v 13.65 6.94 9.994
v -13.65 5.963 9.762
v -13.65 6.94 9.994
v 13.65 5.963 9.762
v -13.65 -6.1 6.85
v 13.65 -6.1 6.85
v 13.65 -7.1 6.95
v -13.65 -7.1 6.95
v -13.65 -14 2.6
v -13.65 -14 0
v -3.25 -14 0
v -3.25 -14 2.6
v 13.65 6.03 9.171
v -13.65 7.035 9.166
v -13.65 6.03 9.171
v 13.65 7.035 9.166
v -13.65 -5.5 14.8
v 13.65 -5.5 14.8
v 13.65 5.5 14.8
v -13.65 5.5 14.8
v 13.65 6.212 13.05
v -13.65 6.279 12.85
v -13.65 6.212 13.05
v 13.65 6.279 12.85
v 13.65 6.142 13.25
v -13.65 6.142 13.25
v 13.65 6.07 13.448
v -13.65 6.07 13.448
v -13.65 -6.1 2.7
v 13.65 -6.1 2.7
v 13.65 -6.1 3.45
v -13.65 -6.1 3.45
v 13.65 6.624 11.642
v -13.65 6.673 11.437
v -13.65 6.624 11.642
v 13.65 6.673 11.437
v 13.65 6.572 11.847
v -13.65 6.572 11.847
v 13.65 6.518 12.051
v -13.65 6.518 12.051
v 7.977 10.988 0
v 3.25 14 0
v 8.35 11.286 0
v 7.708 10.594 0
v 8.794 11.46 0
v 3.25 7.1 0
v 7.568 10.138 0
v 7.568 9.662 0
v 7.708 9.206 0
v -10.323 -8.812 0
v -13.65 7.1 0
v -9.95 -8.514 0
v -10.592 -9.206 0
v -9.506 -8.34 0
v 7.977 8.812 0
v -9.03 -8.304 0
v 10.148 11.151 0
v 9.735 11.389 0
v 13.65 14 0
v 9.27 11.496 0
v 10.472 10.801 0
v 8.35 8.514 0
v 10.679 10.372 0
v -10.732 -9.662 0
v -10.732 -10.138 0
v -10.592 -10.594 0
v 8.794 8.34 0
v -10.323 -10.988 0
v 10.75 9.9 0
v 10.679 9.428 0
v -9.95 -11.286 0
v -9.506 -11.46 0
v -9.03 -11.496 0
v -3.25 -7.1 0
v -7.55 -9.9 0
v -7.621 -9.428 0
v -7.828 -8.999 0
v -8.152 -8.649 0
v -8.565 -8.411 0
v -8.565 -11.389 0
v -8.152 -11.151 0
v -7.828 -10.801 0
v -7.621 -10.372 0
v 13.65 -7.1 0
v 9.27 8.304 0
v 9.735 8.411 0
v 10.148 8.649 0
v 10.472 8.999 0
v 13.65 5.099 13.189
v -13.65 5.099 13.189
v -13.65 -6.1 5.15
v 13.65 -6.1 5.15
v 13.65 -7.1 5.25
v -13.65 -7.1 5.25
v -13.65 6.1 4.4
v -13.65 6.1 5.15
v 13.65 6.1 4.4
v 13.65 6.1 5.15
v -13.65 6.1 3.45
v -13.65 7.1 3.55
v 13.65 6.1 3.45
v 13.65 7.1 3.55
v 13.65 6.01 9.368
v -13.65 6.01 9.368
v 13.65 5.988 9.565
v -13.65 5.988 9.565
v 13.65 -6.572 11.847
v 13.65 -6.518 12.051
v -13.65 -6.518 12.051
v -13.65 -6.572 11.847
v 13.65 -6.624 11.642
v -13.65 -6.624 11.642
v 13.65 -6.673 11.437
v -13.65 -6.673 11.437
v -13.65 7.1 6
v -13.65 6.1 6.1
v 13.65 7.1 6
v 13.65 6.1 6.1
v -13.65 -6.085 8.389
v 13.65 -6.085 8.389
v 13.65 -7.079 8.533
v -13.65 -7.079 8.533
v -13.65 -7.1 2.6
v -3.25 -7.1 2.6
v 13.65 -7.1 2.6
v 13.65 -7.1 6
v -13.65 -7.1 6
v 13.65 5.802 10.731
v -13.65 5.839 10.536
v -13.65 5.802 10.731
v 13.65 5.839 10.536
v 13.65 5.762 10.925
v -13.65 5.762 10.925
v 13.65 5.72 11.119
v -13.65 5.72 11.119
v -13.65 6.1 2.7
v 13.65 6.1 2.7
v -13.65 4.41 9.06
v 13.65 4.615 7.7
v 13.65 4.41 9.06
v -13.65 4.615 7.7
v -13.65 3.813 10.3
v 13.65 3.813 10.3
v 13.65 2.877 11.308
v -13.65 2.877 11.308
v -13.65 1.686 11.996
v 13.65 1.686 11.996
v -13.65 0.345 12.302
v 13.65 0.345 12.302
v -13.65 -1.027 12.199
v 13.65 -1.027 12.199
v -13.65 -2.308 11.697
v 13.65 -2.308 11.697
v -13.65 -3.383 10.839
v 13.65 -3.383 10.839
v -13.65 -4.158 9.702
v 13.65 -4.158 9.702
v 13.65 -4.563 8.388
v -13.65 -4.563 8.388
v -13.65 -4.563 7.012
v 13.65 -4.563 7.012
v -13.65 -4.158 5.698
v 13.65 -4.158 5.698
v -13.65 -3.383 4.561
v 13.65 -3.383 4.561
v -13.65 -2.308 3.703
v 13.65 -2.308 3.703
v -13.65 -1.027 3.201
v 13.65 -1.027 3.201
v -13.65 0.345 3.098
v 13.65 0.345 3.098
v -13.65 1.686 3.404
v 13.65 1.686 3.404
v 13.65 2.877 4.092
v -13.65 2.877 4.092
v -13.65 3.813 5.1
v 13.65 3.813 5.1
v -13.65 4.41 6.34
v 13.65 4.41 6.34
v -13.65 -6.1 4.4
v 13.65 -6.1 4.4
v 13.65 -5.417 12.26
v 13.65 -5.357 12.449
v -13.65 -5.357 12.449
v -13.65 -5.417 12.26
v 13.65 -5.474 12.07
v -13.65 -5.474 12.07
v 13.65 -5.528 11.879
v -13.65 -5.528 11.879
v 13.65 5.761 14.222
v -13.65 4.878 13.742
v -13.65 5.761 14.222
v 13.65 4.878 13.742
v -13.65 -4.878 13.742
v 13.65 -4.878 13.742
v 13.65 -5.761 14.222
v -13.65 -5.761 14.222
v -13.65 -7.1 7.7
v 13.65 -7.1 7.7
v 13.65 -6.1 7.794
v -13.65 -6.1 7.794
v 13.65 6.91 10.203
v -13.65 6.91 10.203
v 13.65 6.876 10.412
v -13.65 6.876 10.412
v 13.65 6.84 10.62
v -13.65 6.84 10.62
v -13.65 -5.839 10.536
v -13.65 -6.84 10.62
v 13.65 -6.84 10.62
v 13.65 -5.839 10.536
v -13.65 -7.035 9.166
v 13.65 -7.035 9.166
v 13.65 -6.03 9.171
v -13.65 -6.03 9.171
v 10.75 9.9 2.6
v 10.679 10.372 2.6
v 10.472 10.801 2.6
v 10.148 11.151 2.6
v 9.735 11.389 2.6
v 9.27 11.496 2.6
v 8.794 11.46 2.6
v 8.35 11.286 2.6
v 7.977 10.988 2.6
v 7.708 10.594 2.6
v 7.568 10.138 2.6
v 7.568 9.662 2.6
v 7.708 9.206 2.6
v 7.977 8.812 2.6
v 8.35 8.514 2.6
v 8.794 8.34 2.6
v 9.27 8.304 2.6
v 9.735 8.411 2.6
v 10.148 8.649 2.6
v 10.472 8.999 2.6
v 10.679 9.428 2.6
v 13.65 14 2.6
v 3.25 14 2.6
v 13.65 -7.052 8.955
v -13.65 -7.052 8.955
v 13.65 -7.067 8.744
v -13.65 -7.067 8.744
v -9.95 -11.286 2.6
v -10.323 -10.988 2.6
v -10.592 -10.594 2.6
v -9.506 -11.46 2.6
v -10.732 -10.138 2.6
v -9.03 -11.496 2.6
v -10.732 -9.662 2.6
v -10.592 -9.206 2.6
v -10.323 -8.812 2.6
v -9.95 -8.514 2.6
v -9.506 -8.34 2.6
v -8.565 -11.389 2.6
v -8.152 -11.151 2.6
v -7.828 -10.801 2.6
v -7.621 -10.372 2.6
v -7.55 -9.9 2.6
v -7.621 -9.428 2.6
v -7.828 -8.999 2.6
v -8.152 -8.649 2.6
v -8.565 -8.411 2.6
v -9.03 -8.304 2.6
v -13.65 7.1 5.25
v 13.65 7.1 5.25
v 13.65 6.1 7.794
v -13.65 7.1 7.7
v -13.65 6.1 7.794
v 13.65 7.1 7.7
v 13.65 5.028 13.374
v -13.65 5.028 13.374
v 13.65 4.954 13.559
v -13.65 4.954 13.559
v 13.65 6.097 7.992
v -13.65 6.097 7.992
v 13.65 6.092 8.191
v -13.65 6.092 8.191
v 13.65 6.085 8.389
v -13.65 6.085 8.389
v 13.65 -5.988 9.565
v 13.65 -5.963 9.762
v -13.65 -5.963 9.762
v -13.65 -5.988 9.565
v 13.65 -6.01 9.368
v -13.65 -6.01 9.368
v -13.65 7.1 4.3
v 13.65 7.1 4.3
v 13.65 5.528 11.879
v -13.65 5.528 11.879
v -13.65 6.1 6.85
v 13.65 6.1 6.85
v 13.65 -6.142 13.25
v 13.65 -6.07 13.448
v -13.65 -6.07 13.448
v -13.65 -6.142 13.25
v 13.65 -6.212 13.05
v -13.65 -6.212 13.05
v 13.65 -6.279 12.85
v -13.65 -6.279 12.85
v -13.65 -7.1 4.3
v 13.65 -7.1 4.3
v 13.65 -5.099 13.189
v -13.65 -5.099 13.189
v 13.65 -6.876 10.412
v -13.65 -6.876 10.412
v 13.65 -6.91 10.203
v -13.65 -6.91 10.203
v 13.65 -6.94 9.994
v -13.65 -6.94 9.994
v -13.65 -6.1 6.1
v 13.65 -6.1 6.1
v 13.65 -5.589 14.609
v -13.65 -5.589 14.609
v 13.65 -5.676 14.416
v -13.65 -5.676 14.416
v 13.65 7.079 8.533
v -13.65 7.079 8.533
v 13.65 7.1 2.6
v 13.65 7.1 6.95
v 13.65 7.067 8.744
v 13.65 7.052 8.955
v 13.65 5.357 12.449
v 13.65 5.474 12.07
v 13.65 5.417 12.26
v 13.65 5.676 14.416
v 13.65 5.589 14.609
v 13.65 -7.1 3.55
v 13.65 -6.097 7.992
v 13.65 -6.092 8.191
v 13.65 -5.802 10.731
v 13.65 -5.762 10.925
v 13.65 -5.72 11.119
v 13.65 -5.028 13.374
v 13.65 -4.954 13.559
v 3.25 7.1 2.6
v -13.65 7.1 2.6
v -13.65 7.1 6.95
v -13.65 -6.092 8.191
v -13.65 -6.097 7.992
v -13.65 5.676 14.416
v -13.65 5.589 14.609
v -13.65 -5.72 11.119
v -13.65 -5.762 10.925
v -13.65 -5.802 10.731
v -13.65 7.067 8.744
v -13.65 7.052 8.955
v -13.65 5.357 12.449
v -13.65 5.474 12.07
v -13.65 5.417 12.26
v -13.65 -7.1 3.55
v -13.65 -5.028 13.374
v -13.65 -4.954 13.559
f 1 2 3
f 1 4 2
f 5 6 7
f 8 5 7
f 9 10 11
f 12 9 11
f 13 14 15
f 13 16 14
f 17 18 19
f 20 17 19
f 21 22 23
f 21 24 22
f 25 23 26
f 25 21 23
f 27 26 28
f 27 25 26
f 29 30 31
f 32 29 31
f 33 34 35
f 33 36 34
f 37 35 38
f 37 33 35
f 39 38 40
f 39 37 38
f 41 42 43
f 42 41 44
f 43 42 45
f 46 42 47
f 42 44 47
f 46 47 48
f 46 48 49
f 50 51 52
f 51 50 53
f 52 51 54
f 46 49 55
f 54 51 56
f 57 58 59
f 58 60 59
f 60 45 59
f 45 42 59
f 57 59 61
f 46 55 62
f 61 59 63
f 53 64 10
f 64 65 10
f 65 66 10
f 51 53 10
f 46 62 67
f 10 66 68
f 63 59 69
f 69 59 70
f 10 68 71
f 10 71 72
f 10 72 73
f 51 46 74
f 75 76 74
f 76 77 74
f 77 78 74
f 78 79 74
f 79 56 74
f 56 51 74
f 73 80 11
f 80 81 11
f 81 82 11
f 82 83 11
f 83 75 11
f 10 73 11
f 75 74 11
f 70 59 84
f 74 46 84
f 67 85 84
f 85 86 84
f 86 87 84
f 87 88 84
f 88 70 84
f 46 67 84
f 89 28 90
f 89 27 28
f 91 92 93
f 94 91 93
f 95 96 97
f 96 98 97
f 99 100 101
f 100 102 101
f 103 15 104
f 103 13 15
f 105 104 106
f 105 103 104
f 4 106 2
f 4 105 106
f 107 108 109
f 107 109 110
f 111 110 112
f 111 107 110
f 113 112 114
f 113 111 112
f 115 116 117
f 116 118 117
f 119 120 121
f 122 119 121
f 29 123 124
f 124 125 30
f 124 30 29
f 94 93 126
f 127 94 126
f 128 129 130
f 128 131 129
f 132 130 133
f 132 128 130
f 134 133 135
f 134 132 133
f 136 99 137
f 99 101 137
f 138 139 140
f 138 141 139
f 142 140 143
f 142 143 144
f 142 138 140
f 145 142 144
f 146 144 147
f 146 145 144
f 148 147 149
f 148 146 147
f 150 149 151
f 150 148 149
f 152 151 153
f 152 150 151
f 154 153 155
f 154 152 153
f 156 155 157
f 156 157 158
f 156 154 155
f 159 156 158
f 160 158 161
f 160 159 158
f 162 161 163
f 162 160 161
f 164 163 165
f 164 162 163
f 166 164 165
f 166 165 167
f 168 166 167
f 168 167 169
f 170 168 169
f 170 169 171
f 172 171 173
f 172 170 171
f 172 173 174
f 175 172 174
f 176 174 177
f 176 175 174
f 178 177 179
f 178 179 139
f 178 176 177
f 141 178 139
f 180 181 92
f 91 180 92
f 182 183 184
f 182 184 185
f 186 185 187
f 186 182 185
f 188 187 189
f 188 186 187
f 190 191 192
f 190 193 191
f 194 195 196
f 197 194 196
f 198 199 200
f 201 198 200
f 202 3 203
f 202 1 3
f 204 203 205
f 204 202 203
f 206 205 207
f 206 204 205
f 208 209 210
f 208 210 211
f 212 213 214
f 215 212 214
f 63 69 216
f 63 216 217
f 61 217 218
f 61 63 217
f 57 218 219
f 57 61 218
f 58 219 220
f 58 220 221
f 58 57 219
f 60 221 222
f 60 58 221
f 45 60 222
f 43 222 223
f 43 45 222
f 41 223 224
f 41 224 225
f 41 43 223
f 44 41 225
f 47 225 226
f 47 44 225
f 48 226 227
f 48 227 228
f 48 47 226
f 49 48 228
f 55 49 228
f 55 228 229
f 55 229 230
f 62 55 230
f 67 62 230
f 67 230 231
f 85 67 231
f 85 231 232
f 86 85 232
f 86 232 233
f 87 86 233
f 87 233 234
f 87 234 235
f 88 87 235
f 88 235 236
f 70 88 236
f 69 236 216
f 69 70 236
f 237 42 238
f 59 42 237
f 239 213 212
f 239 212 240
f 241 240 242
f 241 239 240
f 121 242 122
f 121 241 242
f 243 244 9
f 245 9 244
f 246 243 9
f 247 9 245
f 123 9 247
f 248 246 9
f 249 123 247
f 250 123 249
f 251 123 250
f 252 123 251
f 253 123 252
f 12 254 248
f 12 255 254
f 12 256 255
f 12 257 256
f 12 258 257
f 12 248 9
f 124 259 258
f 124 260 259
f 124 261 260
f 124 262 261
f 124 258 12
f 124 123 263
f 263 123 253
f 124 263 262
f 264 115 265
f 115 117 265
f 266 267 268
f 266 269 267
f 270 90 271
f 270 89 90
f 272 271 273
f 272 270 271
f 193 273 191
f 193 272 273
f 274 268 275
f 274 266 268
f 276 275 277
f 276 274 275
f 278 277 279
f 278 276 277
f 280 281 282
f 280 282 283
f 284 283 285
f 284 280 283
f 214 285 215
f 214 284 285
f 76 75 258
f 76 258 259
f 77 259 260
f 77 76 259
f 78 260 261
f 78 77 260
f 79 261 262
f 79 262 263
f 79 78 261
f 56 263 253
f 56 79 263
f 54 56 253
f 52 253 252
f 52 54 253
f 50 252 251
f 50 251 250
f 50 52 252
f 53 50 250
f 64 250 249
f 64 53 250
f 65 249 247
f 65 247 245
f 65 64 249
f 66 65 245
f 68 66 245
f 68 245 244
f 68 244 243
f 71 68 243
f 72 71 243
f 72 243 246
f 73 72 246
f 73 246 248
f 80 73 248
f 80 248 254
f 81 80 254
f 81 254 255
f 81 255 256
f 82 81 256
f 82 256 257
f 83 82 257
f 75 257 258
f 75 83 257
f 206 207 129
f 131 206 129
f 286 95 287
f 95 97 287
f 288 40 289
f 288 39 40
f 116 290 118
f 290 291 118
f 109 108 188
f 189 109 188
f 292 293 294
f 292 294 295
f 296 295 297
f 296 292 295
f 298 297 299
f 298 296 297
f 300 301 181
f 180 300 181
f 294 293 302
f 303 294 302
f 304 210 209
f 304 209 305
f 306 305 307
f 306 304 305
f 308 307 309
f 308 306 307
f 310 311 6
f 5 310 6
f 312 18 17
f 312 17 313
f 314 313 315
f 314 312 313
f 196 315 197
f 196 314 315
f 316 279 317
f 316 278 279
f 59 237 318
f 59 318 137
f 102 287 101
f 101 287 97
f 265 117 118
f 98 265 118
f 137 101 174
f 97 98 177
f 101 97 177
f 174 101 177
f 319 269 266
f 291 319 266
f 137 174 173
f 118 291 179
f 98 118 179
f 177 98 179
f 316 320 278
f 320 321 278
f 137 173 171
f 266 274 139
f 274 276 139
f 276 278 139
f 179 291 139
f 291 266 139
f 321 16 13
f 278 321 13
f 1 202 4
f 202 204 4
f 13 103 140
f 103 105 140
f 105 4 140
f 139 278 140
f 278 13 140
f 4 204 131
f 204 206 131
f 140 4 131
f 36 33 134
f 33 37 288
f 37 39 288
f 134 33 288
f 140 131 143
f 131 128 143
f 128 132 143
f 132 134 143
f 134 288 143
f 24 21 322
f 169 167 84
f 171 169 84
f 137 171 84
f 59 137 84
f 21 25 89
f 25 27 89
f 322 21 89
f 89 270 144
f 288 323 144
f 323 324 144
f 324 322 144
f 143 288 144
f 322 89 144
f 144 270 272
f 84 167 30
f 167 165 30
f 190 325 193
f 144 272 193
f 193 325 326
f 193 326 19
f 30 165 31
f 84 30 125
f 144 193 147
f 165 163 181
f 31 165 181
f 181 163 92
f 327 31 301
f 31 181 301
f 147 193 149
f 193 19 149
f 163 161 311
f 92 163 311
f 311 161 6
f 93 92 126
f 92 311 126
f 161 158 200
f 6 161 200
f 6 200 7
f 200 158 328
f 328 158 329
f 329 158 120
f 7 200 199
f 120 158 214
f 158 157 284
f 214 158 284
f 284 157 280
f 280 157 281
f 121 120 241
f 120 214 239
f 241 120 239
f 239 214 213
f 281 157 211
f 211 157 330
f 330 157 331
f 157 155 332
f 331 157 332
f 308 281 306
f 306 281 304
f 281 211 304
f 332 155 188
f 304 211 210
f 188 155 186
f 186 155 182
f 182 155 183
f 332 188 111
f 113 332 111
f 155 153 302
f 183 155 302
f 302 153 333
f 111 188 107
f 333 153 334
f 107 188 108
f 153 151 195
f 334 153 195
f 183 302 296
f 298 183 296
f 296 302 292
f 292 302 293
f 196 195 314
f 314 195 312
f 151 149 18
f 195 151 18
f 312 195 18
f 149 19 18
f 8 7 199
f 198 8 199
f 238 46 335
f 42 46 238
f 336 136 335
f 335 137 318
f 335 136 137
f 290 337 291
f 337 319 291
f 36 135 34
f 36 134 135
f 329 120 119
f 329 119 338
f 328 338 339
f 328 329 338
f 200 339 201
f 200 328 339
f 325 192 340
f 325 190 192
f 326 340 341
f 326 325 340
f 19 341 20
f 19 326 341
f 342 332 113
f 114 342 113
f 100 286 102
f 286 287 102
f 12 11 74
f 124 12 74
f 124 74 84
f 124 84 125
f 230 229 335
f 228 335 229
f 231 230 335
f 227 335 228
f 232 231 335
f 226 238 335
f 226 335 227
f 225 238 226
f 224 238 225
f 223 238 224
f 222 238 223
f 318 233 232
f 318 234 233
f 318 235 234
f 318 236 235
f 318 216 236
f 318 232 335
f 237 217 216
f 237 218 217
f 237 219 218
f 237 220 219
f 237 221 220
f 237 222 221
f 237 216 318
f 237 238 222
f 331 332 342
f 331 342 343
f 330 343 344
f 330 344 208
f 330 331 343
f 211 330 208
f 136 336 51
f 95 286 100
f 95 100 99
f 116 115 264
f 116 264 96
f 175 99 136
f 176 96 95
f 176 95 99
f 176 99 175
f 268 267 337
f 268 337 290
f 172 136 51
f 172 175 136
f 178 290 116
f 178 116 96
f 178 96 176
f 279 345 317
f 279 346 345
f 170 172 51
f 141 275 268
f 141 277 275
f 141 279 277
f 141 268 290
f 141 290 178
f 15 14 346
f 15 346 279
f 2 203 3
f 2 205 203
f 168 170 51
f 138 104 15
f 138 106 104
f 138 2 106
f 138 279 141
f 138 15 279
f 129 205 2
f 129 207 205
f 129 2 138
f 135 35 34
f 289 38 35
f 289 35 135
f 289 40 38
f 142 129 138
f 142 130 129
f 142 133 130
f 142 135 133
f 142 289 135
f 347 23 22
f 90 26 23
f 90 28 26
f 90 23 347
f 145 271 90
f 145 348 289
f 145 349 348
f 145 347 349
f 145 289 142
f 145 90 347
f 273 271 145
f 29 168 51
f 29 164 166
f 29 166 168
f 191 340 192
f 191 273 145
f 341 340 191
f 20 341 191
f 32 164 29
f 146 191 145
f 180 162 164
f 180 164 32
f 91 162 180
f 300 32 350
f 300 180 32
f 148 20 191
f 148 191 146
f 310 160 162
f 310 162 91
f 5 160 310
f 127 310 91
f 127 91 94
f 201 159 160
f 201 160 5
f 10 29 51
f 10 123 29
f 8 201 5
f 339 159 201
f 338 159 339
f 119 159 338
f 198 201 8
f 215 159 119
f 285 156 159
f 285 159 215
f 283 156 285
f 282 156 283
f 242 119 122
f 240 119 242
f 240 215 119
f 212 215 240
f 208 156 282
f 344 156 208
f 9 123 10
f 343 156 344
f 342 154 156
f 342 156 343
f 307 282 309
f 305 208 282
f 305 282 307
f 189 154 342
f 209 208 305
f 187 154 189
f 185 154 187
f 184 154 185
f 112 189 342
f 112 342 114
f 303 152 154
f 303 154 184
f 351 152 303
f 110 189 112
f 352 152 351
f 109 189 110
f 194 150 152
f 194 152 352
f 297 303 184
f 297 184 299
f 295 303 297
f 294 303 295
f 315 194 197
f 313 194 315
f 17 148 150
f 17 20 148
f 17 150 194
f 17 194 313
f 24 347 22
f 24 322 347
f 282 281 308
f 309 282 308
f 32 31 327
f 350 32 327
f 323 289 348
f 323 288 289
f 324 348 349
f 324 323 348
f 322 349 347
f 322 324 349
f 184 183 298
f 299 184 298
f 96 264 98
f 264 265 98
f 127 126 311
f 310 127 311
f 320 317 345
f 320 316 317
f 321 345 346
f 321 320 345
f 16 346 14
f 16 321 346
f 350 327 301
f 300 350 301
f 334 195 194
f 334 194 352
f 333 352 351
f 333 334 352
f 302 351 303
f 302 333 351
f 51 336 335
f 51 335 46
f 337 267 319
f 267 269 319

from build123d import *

# Parameters (mm, degrees)
SKETCH_R         = 4.615
EXTRUDE_DEPTH    = 13.65
SKETCH001_W      = 10.4
SKETCH001_H      = 6.9
SKETCH001_R      = 1.6
EXTRUDE001_DEPTH = 2.6


with BuildPart() as body_main:
    # Sketch → Extrude (new body, symmetric)
    with BuildSketch(Plane.YZ):
        with BuildLine():
            Line((-5.5, 14.8), (5.5, 14.8))
            ThreePointArc((5.760824, 14.2224), (5.633177, 14.512448), (5.5, 14.8))
            Line((4.878487, 13.741903), (5.760824, 14.2224))
            ThreePointArc((5.099264, 13.188869), (4.991522, 13.466442), (4.878487, 13.741903))
            Line((6.069929, 13.448108), (5.099264, 13.188869))
            ThreePointArc((6.278586, 12.849682), (6.177122, 13.149894), (6.069929, 13.448108))
            Line((5.357169, 12.449197), (6.278586, 12.849682))
            ThreePointArc((5.528111, 11.878788), (5.44537, 12.164811), (5.357169, 12.449197))
            Line((6.517918, 12.051062), (5.528111, 11.878788))
            ThreePointArc((6.672768, 11.436511), (6.598284, 11.744528), (6.517918, 12.051062))
            Line((5.719511, 11.119185), (6.672768, 11.436511))
            ThreePointArc((5.839274, 10.53588), (5.782184, 10.828106), (5.719511, 11.119185))
            Line((6.840447, 10.619837), (5.839274, 10.53588))
            ThreePointArc((6.940275, 9.993989), (6.893357, 10.307391), (6.840447, 10.619837))
            Line((5.962664, 9.762314), (6.940275, 9.993989))
            ThreePointArc((6.03031, 9.170696), (5.999319, 9.466829), (5.962664, 9.762314))
            Line((7.034984, 9.165675), (6.03031, 9.170696))
            ThreePointArc((7.079005, 8.533446), (7.06002, 8.849771), (7.034984, 9.165675))
            Line((6.08472, 8.389243), (7.079005, 8.533446))
            ThreePointArc((6.099716, 7.793958), (6.095067, 8.091672), (6.08472, 8.389243))
            Line((7.1, 7.7), (6.099716, 7.793958))
            Line((7.1, 7.7), (7.1, 6.95))
            Line((7.1, 6.95), (6.1, 6.85))
            Line((6.1, 6.85), (6.1, 6.1))
            Line((6.1, 6.1), (7.1, 6))
            Line((7.1, 6), (7.1, 5.25))
            Line((7.1, 5.25), (6.1, 5.15))
            Line((6.1, 5.15), (6.1, 4.4))
            Line((6.1, 4.4), (7.1, 4.3))
            Line((7.1, 4.3), (7.1, 3.55))
            Line((7.1, 3.55), (6.1, 3.45))
            Line((6.1, 3.45), (6.1, 2.7))
            Line((6.1, 2.7), (7.1, 2.6))
            Line((7.1, 2.6), (7.1, 0))
            Line((7.1, 0), (-7.1, 0))
            Line((-7.1, 0), (-7.1, 2.6))
            Line((-7.1, 2.6), (-6.1, 2.7))
            Line((-6.1, 2.7), (-6.1, 3.45))
            Line((-6.1, 3.45), (-7.1, 3.55))
            Line((-7.1, 3.55), (-7.1, 4.3))
            Line((-7.1, 4.3), (-6.1, 4.4))
            Line((-6.1, 4.4), (-6.1, 5.15))
            Line((-6.1, 5.15), (-7.1, 5.25))
            Line((-7.1, 5.25), (-7.1, 6))
            Line((-7.1, 6), (-6.1, 6.1))
            Line((-6.1, 6.1), (-6.1, 6.85))
            Line((-6.1, 6.85), (-7.1, 6.95))
            Line((-7.1, 6.95), (-7.1, 7.7))
            Line((-7.1, 7.7), (-6.099716, 7.793958))
            ThreePointArc((-6.08472, 8.389243), (-6.095067, 8.091672), (-6.099716, 7.793958))
            Line((-6.08472, 8.389243), (-7.079005, 8.533446))
            ThreePointArc((-7.034984, 9.165675), (-7.06002, 8.849771), (-7.079005, 8.533446))
            Line((-7.034984, 9.165675), (-6.03031, 9.170696))
            ThreePointArc((-5.962664, 9.762314), (-5.999319, 9.466829), (-6.03031, 9.170696))
            Line((-5.962664, 9.762314), (-6.940275, 9.993989))
            ThreePointArc((-6.840447, 10.619837), (-6.893357, 10.307391), (-6.940275, 9.993989))
            Line((-6.840447, 10.619837), (-5.839274, 10.53588))
            ThreePointArc((-5.719511, 11.119185), (-5.782184, 10.828106), (-5.839274, 10.53588))
            Line((-5.719511, 11.119185), (-6.672768, 11.436511))
            ThreePointArc((-6.517918, 12.051062), (-6.598284, 11.744528), (-6.672768, 11.436511))
            Line((-6.517918, 12.051062), (-5.528111, 11.878788))
            ThreePointArc((-5.357169, 12.449197), (-5.44537, 12.164811), (-5.528111, 11.878788))
            Line((-5.357169, 12.449197), (-6.278586, 12.849682))
            ThreePointArc((-6.069929, 13.448108), (-6.177122, 13.149894), (-6.278586, 12.849682))
            Line((-6.069929, 13.448108), (-5.099264, 13.188869))
            ThreePointArc((-4.878487, 13.741903), (-4.991522, 13.466442), (-5.099264, 13.188869))
            Line((-4.878487, 13.741903), (-5.760824, 14.2224))
            ThreePointArc((-5.5, 14.8), (-5.633177, 14.512448), (-5.760824, 14.2224))
        make_face()
        with Locations((0, 7.7)):
            Circle(SKETCH_R, mode=Mode.SUBTRACT)
    extrude(amount=EXTRUDE_DEPTH, both=True)


with BuildPart() as body:
    # Sketch001 → Extrude001 (new body)
    with BuildSketch(Plane.XY):
        with Locations((8.45, 10.55)):
            Rectangle(SKETCH001_W, SKETCH001_H)
        with Locations((9.15, 9.9)):
            Circle(SKETCH001_R, mode=Mode.SUBTRACT)
        with Locations((-8.45, -10.55)):
            Rectangle(SKETCH001_W, SKETCH001_H)
        with Locations((-9.15, -9.9)):
            Circle(SKETCH001_R, mode=Mode.SUBTRACT)
    extrude(amount=EXTRUDE001_DEPTH)

    # Fusion: union Body Main
    add(body_main.part)


solid = body.part
